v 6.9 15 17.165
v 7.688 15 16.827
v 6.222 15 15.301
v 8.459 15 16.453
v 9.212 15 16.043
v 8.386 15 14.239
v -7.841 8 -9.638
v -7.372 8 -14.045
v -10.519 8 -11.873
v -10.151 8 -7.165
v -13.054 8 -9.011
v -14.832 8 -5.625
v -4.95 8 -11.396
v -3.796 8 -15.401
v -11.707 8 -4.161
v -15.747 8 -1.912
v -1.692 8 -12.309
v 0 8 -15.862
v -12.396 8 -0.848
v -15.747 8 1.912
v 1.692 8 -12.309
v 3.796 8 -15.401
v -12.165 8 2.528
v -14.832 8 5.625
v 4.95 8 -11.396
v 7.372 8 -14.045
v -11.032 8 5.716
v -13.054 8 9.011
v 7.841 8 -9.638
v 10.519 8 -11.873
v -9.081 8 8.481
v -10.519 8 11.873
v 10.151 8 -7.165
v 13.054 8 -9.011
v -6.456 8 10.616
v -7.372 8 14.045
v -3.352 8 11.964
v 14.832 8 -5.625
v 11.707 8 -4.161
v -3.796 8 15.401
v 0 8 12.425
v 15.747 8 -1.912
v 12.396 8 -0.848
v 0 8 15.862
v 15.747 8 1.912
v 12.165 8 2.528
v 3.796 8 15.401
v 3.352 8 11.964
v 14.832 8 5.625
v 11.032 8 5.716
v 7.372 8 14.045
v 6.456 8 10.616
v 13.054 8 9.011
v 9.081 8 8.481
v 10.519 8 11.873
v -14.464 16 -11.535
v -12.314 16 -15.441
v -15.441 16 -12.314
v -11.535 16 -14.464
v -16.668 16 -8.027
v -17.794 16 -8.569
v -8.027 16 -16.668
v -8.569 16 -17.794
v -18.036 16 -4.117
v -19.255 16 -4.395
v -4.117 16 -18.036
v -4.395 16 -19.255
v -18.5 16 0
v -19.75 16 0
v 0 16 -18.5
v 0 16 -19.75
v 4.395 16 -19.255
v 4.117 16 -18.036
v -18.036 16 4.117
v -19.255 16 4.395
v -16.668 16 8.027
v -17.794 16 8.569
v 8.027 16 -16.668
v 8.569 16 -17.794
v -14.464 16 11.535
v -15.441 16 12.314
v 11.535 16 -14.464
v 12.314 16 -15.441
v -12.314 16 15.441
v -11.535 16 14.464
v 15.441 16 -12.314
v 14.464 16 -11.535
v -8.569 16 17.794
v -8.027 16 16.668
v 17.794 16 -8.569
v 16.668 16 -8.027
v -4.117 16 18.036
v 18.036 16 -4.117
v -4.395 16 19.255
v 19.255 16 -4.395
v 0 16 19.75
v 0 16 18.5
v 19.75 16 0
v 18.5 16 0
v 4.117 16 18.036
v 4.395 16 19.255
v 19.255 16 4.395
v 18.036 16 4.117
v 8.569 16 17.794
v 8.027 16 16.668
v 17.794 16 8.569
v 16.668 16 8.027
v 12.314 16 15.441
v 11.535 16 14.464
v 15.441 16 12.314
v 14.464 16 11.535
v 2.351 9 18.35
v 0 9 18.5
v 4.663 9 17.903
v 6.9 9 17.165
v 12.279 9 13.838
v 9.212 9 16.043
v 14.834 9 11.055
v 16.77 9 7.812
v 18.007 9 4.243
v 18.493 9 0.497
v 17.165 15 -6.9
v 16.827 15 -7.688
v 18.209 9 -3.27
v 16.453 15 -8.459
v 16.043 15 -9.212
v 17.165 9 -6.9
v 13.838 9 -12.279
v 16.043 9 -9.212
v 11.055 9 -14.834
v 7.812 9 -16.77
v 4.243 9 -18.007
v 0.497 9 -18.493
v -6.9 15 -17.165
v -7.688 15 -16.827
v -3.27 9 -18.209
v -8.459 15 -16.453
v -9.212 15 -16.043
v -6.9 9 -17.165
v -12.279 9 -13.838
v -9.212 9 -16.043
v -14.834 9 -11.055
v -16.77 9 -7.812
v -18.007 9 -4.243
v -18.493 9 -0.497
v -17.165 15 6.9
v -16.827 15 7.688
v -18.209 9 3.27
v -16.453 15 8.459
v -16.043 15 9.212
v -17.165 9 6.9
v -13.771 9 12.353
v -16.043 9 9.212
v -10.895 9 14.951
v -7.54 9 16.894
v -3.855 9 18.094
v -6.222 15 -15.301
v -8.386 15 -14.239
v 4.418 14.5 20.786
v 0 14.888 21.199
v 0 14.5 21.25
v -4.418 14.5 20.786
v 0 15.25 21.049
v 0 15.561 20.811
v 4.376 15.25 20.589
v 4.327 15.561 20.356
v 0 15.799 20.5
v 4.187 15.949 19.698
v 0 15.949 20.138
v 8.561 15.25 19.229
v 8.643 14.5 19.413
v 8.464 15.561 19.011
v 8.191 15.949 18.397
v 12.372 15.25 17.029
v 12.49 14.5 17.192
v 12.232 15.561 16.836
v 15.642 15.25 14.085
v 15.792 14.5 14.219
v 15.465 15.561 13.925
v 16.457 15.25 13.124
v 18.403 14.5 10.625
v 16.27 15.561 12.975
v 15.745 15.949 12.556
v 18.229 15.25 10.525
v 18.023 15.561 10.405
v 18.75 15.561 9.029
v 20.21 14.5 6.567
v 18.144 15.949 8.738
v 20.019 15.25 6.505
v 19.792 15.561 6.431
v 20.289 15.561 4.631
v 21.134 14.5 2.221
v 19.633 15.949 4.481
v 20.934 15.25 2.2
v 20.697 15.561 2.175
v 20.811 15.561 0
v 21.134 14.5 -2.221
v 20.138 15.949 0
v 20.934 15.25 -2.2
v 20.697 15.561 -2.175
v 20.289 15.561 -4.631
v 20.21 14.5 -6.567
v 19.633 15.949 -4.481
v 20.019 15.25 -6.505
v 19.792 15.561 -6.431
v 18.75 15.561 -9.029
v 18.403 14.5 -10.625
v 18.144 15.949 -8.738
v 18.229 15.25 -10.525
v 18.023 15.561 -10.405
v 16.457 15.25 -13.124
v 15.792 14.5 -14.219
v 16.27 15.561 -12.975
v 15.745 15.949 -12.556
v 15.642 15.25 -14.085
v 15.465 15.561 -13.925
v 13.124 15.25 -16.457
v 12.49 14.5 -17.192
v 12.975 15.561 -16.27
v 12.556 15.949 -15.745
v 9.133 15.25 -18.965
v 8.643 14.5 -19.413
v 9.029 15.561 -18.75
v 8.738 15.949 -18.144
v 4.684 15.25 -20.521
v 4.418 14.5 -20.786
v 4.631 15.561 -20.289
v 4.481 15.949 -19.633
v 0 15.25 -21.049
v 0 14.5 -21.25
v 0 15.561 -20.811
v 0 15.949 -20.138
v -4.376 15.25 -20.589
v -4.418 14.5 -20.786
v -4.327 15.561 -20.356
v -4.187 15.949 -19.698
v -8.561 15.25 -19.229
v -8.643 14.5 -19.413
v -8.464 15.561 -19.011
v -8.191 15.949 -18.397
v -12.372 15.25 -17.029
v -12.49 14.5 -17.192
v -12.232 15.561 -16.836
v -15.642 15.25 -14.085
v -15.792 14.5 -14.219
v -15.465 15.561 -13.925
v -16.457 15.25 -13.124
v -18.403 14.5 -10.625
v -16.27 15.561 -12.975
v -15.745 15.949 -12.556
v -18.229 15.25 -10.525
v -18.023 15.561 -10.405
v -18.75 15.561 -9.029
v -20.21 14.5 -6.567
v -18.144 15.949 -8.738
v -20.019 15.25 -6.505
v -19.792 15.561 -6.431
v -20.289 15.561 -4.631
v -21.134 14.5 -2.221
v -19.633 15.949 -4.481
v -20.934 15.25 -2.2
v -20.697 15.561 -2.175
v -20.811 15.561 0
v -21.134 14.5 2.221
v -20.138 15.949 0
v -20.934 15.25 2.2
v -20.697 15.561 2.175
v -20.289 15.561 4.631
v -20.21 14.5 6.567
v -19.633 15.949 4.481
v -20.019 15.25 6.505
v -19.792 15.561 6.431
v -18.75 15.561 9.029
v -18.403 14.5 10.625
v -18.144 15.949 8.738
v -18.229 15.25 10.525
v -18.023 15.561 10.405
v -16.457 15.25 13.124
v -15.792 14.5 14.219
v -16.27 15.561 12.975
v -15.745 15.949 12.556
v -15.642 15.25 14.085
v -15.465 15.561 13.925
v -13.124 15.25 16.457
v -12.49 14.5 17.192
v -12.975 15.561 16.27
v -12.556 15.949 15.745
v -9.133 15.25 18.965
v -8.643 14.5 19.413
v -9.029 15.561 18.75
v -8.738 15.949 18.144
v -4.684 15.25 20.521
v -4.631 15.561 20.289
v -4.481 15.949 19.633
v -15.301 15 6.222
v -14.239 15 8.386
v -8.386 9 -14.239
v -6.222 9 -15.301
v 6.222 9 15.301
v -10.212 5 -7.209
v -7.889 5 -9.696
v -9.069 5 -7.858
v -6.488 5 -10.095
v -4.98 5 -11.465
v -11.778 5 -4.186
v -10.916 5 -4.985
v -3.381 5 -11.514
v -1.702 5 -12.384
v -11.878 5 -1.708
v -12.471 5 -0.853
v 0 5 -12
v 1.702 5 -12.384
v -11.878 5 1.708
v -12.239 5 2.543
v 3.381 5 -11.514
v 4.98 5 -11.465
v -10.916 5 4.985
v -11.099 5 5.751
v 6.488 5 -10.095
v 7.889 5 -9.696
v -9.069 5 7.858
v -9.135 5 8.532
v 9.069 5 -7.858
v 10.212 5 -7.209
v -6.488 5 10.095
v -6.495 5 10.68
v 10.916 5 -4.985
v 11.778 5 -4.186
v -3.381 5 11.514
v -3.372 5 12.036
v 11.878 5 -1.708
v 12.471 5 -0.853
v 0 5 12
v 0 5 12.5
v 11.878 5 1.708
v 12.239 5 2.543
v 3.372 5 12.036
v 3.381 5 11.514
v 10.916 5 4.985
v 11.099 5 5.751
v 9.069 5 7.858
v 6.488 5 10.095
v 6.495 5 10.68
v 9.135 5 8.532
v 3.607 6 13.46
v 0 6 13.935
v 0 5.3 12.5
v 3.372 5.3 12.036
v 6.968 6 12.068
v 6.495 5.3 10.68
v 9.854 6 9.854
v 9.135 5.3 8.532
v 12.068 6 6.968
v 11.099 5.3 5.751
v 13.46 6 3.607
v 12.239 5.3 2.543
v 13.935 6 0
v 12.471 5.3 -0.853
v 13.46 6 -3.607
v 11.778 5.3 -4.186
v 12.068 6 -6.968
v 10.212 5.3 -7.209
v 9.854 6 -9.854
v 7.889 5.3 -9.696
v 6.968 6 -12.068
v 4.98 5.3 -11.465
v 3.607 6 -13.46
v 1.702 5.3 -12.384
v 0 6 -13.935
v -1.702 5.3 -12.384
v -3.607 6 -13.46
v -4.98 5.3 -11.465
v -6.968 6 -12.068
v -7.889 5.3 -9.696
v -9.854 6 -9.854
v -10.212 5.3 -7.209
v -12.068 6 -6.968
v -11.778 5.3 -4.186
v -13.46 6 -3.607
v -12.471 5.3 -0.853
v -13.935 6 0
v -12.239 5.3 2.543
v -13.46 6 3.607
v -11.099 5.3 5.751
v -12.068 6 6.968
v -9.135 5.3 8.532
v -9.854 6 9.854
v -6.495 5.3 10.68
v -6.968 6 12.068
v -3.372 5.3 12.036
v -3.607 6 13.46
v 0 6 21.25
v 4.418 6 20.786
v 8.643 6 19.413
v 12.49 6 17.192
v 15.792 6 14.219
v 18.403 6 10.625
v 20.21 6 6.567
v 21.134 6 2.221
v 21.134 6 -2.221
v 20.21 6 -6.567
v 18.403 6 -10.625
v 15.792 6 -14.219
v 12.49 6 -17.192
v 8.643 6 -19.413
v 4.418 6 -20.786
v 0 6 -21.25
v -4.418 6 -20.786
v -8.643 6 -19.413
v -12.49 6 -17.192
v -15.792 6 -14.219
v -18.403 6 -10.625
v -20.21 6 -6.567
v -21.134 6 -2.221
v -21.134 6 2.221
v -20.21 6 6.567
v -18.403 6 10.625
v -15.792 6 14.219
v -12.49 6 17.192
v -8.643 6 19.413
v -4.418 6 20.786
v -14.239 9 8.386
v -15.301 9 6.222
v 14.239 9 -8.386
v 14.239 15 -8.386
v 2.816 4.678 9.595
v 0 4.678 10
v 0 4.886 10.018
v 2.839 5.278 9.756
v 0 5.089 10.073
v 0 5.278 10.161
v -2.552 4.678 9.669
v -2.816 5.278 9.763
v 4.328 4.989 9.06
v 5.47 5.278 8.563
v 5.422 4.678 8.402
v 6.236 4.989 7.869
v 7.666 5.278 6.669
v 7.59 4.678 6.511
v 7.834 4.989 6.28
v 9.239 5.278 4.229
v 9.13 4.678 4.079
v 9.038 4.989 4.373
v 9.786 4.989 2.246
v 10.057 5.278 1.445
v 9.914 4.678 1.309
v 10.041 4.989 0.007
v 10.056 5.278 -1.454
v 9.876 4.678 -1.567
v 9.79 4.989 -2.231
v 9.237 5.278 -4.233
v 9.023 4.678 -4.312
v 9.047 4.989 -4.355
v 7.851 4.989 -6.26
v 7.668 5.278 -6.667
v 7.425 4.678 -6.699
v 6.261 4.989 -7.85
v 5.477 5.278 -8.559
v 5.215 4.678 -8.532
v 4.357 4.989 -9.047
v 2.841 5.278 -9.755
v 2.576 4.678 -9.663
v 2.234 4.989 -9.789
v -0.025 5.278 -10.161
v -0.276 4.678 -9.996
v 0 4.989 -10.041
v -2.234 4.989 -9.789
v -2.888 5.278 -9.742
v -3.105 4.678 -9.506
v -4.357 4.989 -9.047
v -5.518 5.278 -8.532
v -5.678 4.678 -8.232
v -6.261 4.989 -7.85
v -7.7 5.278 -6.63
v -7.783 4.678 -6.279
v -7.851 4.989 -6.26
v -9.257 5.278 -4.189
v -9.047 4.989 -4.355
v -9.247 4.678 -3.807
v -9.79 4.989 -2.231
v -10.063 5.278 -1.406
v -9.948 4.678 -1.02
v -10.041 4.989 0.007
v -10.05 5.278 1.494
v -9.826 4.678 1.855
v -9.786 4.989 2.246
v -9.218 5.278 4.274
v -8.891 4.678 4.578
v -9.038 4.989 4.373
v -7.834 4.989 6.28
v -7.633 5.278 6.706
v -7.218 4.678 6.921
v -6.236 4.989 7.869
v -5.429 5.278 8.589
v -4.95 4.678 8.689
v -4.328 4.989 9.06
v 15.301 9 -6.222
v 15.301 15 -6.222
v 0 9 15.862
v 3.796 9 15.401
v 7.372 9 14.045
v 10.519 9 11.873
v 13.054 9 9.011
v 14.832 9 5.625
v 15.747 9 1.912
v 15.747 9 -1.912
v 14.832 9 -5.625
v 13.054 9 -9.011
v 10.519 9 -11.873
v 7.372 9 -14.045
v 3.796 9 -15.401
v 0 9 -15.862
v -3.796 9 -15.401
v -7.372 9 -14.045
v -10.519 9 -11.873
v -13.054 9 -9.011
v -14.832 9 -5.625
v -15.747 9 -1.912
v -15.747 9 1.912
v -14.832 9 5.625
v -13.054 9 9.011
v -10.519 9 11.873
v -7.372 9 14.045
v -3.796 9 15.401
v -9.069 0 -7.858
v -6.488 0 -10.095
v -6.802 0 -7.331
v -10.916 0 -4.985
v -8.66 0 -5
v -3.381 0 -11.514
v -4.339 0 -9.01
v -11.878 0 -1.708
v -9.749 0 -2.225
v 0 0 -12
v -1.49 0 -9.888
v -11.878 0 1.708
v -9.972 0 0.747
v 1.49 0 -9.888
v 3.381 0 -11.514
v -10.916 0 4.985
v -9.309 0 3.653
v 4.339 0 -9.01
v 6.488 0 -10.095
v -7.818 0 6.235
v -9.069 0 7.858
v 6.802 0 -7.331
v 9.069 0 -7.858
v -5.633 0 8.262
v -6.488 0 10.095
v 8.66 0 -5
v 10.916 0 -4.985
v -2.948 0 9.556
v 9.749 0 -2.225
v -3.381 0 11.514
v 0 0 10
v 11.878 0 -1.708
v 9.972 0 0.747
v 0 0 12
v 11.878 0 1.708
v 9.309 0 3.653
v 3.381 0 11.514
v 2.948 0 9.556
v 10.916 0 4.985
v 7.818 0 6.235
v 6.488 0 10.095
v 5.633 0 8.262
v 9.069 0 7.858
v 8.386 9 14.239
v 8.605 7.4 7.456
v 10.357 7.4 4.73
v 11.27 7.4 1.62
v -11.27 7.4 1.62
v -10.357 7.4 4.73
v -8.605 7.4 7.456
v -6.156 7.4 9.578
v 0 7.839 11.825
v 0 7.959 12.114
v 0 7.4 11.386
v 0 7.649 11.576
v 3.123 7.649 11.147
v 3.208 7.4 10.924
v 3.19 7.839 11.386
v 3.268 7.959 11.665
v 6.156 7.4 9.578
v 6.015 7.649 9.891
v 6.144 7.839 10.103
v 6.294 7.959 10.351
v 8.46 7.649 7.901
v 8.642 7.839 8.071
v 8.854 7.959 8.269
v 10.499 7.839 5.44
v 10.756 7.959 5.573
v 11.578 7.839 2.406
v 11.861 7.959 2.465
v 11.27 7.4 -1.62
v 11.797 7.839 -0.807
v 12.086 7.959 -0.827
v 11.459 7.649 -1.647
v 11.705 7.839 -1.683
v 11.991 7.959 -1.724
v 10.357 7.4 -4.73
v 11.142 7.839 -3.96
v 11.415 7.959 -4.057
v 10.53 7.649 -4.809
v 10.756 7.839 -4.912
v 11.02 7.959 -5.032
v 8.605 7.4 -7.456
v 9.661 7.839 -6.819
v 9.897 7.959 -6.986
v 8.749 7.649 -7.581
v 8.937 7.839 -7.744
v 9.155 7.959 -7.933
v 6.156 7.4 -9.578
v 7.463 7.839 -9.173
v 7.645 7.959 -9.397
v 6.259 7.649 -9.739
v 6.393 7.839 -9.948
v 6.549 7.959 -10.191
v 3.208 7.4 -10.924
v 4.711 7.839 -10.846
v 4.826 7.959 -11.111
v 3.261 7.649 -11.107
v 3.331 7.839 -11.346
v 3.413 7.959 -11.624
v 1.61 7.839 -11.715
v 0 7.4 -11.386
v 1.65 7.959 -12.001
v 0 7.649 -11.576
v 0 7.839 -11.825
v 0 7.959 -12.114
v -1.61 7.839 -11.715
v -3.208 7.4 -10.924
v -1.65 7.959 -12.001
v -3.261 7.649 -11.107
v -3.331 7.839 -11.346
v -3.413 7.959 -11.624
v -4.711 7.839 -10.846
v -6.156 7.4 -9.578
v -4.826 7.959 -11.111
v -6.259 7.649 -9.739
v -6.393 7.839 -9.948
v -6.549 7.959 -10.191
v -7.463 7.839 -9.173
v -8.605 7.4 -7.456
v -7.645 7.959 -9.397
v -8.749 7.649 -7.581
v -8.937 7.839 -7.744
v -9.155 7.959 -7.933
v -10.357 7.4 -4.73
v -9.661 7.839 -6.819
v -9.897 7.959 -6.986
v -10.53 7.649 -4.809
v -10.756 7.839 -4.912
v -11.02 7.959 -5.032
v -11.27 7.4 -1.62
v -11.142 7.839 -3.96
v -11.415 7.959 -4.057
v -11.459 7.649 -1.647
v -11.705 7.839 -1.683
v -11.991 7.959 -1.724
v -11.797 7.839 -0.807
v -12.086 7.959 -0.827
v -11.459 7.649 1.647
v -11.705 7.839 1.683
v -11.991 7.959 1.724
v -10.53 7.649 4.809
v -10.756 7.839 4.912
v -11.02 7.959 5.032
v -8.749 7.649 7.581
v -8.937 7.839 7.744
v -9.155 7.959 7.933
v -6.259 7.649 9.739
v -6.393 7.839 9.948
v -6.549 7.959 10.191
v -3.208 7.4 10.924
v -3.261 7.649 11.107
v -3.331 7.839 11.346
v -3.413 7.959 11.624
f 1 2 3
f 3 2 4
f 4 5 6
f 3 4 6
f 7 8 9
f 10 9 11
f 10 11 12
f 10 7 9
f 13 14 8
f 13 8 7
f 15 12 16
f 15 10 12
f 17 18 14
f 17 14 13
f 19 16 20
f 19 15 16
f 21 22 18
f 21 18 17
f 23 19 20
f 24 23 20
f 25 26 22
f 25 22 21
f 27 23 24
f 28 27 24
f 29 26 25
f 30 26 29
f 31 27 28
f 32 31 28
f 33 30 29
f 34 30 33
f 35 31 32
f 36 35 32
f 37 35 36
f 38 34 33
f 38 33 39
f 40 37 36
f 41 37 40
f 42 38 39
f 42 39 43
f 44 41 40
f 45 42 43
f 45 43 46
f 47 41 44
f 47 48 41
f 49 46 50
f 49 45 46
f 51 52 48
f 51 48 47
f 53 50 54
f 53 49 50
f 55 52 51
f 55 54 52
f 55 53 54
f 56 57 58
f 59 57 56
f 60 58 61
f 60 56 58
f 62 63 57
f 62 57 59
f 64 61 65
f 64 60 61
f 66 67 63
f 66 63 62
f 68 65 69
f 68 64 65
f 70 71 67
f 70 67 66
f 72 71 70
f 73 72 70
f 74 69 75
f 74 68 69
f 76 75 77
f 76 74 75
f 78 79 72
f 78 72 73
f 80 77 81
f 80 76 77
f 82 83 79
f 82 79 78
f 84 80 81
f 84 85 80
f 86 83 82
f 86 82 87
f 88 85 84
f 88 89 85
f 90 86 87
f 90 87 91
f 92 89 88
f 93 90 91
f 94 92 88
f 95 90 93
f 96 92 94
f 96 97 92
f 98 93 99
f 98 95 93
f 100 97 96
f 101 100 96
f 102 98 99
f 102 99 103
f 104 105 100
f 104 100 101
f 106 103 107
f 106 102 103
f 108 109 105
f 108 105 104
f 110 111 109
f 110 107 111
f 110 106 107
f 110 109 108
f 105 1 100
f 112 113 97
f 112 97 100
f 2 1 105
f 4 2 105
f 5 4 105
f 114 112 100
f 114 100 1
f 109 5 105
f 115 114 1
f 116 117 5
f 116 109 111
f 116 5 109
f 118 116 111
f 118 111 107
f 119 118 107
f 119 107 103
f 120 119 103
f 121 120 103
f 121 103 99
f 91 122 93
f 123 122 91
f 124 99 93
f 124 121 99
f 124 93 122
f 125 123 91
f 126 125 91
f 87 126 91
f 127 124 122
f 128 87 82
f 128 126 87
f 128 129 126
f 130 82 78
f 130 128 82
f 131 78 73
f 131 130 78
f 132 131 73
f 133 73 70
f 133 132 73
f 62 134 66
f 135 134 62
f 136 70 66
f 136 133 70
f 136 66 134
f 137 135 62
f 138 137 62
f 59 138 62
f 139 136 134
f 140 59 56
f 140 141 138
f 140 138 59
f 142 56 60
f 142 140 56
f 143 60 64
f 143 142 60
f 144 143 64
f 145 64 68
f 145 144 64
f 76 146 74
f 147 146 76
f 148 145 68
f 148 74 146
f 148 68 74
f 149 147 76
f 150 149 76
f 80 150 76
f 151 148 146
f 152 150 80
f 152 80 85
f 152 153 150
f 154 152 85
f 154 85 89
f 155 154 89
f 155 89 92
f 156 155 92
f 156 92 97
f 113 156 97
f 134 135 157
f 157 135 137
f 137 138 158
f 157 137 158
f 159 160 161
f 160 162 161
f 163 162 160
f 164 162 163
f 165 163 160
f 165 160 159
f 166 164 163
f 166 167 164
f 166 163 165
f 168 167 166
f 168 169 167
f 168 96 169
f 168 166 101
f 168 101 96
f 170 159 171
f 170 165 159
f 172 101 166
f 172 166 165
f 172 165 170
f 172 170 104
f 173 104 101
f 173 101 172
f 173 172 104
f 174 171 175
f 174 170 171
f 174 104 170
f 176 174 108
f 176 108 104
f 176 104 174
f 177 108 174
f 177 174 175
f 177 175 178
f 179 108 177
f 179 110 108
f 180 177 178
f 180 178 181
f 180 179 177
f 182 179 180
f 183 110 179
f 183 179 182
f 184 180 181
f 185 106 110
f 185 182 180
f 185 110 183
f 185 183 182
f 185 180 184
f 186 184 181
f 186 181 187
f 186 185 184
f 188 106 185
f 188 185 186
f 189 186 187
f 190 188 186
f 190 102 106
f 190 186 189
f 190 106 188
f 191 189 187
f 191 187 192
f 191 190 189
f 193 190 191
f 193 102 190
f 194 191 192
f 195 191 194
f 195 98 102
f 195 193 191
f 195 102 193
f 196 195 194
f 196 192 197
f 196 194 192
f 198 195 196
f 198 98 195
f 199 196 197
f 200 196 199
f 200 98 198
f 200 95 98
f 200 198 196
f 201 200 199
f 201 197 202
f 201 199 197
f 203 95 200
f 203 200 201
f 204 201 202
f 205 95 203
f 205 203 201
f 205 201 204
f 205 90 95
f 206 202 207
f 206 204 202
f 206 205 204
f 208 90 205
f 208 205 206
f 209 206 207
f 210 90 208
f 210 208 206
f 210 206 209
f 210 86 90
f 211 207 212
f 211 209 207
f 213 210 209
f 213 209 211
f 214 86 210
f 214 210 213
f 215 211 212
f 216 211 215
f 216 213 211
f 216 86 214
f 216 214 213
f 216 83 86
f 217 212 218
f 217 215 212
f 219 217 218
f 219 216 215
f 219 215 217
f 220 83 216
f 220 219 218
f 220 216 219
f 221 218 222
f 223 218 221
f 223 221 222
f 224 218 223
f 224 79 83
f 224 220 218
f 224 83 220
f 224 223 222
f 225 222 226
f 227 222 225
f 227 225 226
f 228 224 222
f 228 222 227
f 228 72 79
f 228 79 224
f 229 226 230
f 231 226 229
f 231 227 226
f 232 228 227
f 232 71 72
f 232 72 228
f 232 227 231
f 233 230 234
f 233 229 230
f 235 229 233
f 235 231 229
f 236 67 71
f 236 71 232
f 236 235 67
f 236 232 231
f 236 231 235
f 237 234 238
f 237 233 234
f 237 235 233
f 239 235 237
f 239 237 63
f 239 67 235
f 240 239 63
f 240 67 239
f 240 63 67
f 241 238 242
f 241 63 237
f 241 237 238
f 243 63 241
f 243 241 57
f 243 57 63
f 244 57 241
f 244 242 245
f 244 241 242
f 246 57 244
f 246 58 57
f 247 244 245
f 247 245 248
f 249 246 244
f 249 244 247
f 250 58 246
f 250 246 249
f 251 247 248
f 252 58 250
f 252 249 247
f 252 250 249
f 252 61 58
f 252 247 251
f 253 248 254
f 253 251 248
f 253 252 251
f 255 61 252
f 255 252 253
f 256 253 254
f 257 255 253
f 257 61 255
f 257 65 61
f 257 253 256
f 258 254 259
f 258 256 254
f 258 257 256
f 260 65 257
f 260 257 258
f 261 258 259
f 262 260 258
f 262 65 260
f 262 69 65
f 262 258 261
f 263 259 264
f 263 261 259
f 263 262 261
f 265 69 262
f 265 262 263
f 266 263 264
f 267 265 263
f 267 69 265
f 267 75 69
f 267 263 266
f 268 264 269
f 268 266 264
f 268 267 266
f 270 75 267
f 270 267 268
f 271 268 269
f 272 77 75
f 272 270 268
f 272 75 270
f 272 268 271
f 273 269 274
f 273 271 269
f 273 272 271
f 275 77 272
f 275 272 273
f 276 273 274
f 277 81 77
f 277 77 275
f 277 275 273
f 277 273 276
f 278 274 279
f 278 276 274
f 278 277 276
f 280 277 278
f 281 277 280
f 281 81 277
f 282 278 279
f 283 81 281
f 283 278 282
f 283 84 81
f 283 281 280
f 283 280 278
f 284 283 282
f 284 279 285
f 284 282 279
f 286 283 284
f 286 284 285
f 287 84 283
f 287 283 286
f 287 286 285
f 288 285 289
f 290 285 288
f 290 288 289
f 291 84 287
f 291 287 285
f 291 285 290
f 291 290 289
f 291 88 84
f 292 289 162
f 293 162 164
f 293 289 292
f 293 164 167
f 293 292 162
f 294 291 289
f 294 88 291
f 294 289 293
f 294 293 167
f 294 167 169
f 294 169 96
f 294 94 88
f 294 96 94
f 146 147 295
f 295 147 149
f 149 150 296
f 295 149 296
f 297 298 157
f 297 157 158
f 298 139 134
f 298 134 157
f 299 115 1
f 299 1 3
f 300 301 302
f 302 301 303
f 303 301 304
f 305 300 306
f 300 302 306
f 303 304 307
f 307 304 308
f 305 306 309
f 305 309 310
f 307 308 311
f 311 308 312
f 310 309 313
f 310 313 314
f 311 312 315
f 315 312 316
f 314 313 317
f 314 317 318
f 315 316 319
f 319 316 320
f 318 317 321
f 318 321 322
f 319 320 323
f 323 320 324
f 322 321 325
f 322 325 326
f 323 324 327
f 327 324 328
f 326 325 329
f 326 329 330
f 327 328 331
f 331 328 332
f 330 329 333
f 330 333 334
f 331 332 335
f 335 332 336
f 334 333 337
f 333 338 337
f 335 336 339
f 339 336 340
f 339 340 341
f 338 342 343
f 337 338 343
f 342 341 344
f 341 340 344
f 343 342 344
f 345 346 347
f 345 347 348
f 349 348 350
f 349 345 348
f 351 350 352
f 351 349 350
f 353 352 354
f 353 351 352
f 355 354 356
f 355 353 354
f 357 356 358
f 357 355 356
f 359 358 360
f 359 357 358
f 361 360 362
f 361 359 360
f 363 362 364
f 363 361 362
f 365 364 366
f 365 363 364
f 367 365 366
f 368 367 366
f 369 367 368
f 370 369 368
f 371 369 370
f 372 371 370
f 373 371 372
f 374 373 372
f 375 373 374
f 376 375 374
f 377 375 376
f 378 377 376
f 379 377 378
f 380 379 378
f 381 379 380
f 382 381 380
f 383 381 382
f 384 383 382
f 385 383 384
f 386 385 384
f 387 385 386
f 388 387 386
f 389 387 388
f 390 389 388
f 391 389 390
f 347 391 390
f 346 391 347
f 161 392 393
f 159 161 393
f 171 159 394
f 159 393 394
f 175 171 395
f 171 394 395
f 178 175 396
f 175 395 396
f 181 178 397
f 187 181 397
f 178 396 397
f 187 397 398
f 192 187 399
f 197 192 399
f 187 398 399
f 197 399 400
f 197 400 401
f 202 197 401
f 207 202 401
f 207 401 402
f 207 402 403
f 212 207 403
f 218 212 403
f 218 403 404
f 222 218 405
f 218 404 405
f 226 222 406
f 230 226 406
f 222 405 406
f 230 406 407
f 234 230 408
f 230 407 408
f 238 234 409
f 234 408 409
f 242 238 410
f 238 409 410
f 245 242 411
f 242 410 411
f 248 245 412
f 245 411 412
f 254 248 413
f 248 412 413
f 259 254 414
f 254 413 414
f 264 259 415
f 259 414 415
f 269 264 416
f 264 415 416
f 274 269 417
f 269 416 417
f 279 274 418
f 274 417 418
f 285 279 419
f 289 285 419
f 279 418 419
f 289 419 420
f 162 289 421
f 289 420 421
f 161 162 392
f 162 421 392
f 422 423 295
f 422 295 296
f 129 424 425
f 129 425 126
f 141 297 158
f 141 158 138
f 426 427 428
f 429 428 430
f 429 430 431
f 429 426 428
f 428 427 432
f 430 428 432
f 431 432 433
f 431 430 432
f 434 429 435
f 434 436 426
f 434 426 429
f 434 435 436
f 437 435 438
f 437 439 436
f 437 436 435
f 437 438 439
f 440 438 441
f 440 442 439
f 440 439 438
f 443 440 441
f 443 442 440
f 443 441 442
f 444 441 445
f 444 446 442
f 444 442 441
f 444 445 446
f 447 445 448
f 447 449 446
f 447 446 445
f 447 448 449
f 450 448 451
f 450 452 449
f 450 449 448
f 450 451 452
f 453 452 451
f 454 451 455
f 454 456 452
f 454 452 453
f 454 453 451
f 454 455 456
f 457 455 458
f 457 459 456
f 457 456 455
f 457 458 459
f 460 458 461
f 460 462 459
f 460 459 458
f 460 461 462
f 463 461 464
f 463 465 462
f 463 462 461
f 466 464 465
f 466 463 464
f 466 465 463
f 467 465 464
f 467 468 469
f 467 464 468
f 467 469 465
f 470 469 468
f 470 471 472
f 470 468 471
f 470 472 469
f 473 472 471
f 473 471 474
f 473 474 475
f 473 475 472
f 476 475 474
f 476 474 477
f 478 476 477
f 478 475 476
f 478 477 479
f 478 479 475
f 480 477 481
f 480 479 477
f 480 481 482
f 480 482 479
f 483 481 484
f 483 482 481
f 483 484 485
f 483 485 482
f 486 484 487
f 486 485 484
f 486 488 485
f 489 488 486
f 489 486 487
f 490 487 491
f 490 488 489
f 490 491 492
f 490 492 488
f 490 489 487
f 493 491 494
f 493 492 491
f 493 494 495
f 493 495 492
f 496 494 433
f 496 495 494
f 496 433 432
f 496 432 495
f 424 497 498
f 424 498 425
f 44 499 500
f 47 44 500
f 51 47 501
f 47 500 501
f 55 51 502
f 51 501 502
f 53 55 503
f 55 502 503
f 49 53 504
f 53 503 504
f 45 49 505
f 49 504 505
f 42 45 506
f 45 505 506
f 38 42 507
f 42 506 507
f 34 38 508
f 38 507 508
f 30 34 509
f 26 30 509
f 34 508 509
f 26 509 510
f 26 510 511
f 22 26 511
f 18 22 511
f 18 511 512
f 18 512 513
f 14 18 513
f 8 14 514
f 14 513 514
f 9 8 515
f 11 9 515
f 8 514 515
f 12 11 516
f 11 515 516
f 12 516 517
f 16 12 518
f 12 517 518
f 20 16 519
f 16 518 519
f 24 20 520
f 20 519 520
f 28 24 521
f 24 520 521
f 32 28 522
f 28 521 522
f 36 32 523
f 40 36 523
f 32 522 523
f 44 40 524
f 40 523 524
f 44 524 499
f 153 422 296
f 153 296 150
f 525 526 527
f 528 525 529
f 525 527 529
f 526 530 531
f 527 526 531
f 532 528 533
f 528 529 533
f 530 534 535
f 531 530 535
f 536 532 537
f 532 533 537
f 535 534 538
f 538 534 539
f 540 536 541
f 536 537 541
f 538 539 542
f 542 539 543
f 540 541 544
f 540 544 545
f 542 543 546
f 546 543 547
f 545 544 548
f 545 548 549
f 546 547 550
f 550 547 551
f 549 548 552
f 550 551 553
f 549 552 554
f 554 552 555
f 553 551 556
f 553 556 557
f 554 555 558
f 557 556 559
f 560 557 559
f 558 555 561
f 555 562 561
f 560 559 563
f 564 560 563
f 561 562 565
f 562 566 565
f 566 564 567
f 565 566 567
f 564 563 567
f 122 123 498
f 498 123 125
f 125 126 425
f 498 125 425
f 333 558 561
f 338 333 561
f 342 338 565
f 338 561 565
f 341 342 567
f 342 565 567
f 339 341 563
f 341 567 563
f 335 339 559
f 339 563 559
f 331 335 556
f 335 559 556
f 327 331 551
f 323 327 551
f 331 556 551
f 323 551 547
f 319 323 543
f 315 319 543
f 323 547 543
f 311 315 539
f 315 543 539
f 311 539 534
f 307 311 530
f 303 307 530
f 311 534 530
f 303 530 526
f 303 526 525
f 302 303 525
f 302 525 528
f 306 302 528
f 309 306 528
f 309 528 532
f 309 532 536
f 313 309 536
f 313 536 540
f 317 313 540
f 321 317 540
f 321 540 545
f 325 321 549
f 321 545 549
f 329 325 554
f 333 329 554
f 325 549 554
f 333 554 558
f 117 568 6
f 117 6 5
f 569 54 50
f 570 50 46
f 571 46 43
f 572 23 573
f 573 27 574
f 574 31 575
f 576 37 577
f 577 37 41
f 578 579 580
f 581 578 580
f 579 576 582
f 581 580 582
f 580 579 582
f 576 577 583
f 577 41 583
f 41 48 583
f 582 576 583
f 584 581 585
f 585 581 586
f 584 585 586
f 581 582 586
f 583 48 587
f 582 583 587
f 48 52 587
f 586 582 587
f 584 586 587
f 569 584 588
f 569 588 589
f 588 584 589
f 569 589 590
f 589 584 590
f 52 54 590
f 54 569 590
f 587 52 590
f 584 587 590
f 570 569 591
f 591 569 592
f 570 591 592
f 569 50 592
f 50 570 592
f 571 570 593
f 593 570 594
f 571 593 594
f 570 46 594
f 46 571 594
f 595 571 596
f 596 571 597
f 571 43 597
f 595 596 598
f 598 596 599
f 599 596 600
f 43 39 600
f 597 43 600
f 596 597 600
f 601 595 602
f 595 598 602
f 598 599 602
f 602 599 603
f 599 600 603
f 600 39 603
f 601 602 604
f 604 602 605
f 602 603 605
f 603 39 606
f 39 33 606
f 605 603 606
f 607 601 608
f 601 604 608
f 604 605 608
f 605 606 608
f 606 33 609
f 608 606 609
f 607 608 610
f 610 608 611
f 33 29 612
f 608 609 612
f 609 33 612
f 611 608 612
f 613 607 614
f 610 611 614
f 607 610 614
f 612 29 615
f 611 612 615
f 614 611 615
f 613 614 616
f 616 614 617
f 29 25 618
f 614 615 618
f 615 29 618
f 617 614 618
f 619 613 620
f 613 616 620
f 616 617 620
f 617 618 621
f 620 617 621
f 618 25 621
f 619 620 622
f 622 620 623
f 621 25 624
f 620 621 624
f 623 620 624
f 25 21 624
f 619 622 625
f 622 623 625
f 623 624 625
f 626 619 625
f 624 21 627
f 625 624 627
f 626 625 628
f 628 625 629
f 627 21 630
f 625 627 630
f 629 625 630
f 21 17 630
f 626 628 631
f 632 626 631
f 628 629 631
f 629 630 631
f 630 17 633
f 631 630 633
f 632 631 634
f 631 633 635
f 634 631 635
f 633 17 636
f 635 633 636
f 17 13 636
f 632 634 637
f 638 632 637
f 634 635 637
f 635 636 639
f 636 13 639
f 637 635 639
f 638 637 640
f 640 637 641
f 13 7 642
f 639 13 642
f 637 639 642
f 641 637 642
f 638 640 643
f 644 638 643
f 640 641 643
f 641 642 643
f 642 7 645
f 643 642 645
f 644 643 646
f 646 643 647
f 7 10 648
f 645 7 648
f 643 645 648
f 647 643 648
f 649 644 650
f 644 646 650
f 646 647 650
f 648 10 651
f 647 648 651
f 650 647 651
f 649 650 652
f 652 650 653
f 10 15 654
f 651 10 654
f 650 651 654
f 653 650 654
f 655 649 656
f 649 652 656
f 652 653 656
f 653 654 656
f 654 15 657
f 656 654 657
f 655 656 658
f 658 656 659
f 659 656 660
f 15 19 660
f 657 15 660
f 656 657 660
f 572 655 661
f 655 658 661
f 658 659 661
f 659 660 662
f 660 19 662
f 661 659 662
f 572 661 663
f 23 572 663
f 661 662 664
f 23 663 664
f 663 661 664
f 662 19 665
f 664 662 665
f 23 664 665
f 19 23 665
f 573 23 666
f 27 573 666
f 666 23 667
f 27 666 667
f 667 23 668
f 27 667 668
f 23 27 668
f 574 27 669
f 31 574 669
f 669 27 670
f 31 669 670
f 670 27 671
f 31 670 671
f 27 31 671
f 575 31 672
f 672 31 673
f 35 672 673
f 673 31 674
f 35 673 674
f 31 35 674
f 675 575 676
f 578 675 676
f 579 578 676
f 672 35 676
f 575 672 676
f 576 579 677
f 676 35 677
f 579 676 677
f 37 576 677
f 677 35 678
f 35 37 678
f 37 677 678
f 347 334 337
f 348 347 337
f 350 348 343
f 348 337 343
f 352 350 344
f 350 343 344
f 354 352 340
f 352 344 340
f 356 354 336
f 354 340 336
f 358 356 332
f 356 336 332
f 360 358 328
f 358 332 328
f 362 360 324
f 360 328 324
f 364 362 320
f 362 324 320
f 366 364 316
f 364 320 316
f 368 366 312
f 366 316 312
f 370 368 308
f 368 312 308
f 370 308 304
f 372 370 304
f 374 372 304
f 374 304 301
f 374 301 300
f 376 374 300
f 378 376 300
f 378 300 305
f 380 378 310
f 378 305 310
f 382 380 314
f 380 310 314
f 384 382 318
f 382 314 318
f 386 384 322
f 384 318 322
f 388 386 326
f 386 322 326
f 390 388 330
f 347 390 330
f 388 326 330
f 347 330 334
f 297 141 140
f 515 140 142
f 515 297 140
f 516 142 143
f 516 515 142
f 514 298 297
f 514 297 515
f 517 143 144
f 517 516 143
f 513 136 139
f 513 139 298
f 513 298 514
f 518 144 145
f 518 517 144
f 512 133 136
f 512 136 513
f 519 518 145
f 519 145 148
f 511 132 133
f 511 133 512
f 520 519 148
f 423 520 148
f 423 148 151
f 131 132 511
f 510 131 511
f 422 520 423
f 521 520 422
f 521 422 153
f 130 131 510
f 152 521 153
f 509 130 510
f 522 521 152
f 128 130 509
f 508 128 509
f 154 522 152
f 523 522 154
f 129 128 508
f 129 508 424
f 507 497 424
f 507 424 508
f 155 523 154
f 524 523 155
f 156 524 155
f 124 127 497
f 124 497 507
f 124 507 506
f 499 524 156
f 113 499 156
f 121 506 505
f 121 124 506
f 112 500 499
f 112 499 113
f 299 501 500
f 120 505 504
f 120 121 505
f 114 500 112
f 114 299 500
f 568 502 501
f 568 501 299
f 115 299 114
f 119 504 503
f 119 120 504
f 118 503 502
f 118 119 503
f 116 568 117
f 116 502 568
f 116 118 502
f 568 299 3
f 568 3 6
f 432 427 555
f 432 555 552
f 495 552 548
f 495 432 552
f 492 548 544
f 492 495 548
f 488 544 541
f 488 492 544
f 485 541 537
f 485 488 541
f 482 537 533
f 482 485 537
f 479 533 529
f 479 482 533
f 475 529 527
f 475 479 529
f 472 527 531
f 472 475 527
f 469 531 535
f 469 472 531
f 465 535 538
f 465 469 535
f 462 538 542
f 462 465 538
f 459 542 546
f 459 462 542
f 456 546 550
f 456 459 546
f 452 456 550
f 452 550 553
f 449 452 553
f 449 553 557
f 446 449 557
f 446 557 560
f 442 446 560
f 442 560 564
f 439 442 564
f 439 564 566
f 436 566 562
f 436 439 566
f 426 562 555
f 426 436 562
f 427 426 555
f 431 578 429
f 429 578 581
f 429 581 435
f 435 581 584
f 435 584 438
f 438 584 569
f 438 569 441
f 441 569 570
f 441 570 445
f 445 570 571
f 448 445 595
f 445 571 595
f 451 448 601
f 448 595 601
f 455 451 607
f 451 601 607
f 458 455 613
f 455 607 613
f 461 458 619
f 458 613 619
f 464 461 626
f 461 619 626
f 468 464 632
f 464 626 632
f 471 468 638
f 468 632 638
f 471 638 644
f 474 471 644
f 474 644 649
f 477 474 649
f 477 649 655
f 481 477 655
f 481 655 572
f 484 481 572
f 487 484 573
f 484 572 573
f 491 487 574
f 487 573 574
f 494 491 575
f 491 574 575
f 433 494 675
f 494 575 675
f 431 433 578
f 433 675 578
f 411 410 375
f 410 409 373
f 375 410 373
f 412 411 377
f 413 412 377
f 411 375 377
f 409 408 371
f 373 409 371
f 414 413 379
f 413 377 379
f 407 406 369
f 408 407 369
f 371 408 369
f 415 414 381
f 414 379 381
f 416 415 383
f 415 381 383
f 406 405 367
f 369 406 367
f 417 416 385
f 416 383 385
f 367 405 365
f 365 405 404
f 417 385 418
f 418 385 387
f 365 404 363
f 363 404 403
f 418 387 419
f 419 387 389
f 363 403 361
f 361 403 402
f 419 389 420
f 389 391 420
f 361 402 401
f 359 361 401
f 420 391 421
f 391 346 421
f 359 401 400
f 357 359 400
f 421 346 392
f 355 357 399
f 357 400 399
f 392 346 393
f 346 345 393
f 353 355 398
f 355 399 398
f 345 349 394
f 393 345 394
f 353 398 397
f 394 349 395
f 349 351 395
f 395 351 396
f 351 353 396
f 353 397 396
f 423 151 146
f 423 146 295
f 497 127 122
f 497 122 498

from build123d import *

# Parameters (mm, degrees)
SKETCH1_R               = 12
BOSS_EXTRUDE1_DEPTH     = 5
SKETCH2_R               = 12.5
BOSS_EXTRUDE2_DEPTH     = 1
SKETCH6_R               = 21.25
SKETCH6_R_2             = 18.5
SKETCH6_R_3             = 12.5
BOSS_EXTRUDE7_DEPTH     = 3
SKETCH6_3_R             = 21.25
SKETCH6_3_R_2           = 18.5
BOSS_EXTRUDE8_DEPTH     = 10
CUT_EXTRUDE2_DEPTH      = 35.045924866
CUT_EXTRUDE2_DEPTH_BACK = 35.045924866
SKETCH7_R               = 10
BOSS_EXTRUDE9_DEPTH     = 6
CIRPATTERN1_COUNT       = 4
SKETCH10_R              = 15.862399731
CUT_EXTRUDE3_DEPTH      = 1
CHAMFER1_SIZE           = 3
CHAMFER1_SIZE2          = 1.732050808
CHAMFER2_SIZE           = 0.7
CHAMFER2_SIZE2          = 1.435212689
FILLET1_R               = 1.2
FILLET2_R               = 1.5


with BuildPart() as part:
    # Sketch1 → Boss-Extrude1 (new body)
    with BuildSketch(Plane(origin=(0, 0, 0), x_dir=(1, 0, 0), z_dir=(0, 1, 0))):
        with Locations(Location((0, 0, 0), (0, 0, 270))):
            Circle(SKETCH1_R)
    extrude(amount=BOSS_EXTRUDE1_DEPTH)

    # Sketch2 → Boss-Extrude2 (add)
    with BuildSketch(Plane(origin=(0, 5, 0), x_dir=(1, 0, 0), z_dir=(0, 1, 0))):
        with Locations(Location((0, 0, 0), (0, 0, 270))):
            Circle(SKETCH2_R)
    extrude(amount=BOSS_EXTRUDE2_DEPTH)

    # Sketch6 → Boss-Extrude7 (add)
    # profile 1 of 3: a face of its own
    with BuildSketch(Plane(origin=(0, 6, 0), x_dir=(1, 0, 0), z_dir=(0, 1, 0))):
        with Locations(Location((0, 0, 0), (0, 0, 270))):
            Circle(SKETCH6_R)
        Circle(SKETCH6_R_2, mode=Mode.SUBTRACT)
    # profile 2 of 3: a face of its own
    with BuildSketch(Plane(origin=(0, 6, 0), x_dir=(1, 0, 0), z_dir=(0, 1, 0))):
        Circle(SKETCH6_R_2)
        with Locations(Location((0, 0, 0), (0, 0, 270))):
            Circle(SKETCH6_R_3, mode=Mode.SUBTRACT)
    # profile 3 of 3: a face of its own
    with BuildSketch(Plane(origin=(0, 6, 0), x_dir=(1, 0, 0), z_dir=(0, 1, 0))):
        with Locations(Location((0, 0, 0), (0, 0, 270))):
            Circle(SKETCH6_R_3)
    extrude(amount=BOSS_EXTRUDE7_DEPTH)

    # Sketch6<3> → Boss-Extrude8 (add)
    with BuildSketch(Plane(origin=(0, 6, 0), x_dir=(1, 0, 0), z_dir=(0, 1, 0))):
        with Locations(Location((0, 0, 0), (0, 0, 270))):
            Circle(SKETCH6_3_R)
        with Locations(Location((0, 0, 0), (0, 0, 270))):
            Circle(SKETCH6_3_R_2, mode=Mode.SUBTRACT)
    extrude(amount=BOSS_EXTRUDE8_DEPTH)

    # Sketch7 → Cut-Extrude2 (cut, two sides: drawn at the far end of the back side and taken through both)
    with BuildSketch(Plane.XZ.offset(-CUT_EXTRUDE2_DEPTH_BACK)):
        with Locations(Location((0, 0, 0), (0, 0, 90))):
            Circle(SKETCH7_R)
    extrude(amount=CUT_EXTRUDE2_DEPTH + CUT_EXTRUDE2_DEPTH_BACK, mode=Mode.SUBTRACT)

    # Sketch8 → Boss-Extrude9 (add)
    with BuildSketch(Plane(origin=(0, 9, 0), x_dir=(1, 0, 0), z_dir=(0, 1, 0))):
        with BuildLine():
            Line((17.165020759, 6.900149443), (15.300741035, 6.221944311))
            Line((15.300741035, 6.221944311), (14.239421514, 8.386472924))
            Line((14.239421514, 8.386472924), (16.043145314, 9.212355205))
            ThreePointArc((16.043145314, 9.212355205), (16.652877744, 8.079927373), (17.165020759, 6.900149443))
        make_face()
    boss_extrude9 = extrude(amount=BOSS_EXTRUDE9_DEPTH)

    # CirPattern1: Boss-Extrude9 ×4 about axis
    cirpattern1_axis = Axis((0, 0, 0), (0, 1, 0))
    for i in range(1, CIRPATTERN1_COUNT):
        add(boss_extrude9.rotate(cirpattern1_axis, i * 360 / CIRPATTERN1_COUNT))

    # Sketch10 → Cut-Extrude3 (cut)
    with BuildSketch(Plane(origin=(0, 9, 0), x_dir=(1, 0, 0), z_dir=(0, 1, 0))):
        with Locations(Location((0, 0, 0), (0, 0, 270))):
            Circle(SKETCH10_R)
    extrude(amount=-CUT_EXTRUDE3_DEPTH, mode=Mode.SUBTRACT)

    # Chamfer1
    chamfer1_edges = [part.edges().sort_by_distance(p)[0] for p in [
        (0, 8, -10),
    ]]
    chamfer1_side = [part.faces().sort_by_distance(p)[0] for p in [
        (0, 4, -10),
    ]]
    chamfer(chamfer1_edges, length=CHAMFER1_SIZE, length2=CHAMFER1_SIZE2, reference=chamfer1_side[0])

    # Chamfer2
    chamfer2_edges = [part.edges().sort_by_distance(p)[0] for p in [
        (0, 6, -12.5),
    ]]
    chamfer2_side = [part.faces().sort_by_distance(p)[0] for p in [
        (0, 5.5, -12.5),
    ]]
    chamfer(chamfer2_edges, length=CHAMFER2_SIZE, length2=CHAMFER2_SIZE2, reference=chamfer2_side[0])

    # Fillet1
    fillet1_edges = [part.edges().sort_by_distance(p)[0] for p in [
        (0, 8, -11.732050808),
        (0, 5, -10),
    ]]
    fillet(fillet1_edges, radius=FILLET1_R)

    # Fillet2
    fillet2_edges = [part.edges().sort_by_distance(p)[0] for p in [
        (0, 16, -21.25),
    ]]
    fillet(fillet2_edges, radius=FILLET2_R)


solid = part.part
